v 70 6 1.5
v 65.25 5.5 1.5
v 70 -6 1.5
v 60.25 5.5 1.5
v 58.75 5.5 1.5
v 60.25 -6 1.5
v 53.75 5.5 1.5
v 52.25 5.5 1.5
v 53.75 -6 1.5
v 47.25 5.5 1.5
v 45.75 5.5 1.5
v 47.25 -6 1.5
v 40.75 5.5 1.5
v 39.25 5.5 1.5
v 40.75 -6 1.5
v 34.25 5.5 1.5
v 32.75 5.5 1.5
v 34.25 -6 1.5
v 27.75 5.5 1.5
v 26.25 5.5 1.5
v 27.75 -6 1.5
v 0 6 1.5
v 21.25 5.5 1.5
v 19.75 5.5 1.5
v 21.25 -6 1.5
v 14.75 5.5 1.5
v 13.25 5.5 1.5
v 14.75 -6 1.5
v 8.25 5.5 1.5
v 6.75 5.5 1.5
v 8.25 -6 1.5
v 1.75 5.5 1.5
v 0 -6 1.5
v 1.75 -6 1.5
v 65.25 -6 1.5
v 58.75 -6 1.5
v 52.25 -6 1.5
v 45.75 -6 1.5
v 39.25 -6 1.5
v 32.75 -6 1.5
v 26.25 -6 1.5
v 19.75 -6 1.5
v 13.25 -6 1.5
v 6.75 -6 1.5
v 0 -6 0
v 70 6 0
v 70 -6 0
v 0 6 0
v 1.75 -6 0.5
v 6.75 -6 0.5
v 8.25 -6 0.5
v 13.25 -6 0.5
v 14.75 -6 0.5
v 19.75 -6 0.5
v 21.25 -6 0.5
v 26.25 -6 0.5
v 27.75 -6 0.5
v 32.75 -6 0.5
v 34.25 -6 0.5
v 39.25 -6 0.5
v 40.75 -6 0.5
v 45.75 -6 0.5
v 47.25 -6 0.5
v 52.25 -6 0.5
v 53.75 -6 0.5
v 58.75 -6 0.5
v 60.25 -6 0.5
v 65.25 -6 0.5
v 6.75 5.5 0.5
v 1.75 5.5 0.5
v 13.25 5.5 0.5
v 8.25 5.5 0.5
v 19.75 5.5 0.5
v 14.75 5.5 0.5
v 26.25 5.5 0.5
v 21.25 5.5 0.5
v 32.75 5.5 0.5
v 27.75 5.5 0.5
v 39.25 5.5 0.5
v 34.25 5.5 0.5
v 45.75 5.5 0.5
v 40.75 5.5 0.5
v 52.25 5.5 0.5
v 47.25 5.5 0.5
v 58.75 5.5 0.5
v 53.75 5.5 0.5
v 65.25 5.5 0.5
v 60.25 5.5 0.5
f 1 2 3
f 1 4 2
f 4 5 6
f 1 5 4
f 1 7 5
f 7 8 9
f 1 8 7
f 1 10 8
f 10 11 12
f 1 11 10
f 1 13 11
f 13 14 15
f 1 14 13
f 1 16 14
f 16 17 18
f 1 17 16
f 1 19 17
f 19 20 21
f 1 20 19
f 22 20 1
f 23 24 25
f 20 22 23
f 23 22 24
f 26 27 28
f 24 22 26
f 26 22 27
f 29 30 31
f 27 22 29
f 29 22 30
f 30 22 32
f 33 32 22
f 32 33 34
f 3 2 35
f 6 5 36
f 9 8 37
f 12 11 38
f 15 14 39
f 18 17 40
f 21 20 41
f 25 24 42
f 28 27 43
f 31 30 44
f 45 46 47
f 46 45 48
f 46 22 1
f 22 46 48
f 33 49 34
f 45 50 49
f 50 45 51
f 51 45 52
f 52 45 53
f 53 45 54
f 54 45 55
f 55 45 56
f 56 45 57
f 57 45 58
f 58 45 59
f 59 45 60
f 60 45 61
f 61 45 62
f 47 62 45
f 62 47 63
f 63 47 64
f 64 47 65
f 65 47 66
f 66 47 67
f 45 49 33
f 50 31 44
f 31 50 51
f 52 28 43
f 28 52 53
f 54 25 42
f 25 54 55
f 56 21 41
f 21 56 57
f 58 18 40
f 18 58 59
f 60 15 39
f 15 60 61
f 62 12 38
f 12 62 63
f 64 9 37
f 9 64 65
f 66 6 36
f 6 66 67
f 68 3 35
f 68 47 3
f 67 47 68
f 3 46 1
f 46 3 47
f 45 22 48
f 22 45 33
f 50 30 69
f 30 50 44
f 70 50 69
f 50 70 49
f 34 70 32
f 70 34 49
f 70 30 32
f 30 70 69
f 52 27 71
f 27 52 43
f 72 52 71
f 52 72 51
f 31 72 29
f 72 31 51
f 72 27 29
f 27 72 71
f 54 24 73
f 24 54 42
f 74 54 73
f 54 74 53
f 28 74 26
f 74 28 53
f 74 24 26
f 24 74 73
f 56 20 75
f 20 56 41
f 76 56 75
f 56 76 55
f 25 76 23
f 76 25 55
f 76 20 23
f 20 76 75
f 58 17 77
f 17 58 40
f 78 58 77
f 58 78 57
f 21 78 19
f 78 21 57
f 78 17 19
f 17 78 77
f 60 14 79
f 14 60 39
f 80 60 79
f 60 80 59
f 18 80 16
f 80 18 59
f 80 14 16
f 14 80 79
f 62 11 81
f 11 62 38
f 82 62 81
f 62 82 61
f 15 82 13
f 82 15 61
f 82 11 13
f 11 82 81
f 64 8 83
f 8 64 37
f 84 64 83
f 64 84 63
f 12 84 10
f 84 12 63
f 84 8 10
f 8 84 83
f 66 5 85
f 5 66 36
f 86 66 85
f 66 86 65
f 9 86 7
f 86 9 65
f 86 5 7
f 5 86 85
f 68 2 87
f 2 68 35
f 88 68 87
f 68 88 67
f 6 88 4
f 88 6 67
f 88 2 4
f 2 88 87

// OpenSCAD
// 10-well comb for casting agarose gels
// Print orientation: flat on bed, teeth pointing up (+Z)

// ---------- Parameters ----------
spine_len      = 70;    // spine (back bar) length along X
spine_wid      = 12;    // spine width along Y
plate_thk      = 1.5;   // comb plate thickness along Z

tooth_count    = 10;    // number of wells/teeth
tooth_w        = 5.0;   // tooth width along X
tooth_l        = 12;    // tooth length along Y
tooth_pitch    = 1.5;   // centre-to-centre spacing of teeth in X

eps            = 0.5;   // overcut for clean differences
$fn            = 64;

// ---------- Derived ----------
teeth_total_w  = tooth_count * tooth_w + (tooth_count + 1) * tooth_pitch;
x0             = (spine_len - teeth_total_w) / 2;   // row centre offset in X

// ---------- Model ----------
difference() {
    union() {
        // Spine
        translate([0, -spine_wid / 2, 0])
            cube([spine_len, spine_wid, plate_thk]);

        // Teeth
        for (i = [0 : tooth_count - 1])
            translate([x0 + i * (tooth_w + tooth_pitch), -tooth_l / 2, 0])
                cube([tooth_w, tooth_l, plate_thk]);
    }

    // Pockets the teeth cut up into the plate (open at the top face)
    for (i = [0 : tooth_count - 1])
        translate([x0 + i * (tooth_w + tooth_pitch), -tooth_l / 2 - eps, eps])
            cube([tooth_w, tooth_l, plate_thk + 2 * eps]);
}
